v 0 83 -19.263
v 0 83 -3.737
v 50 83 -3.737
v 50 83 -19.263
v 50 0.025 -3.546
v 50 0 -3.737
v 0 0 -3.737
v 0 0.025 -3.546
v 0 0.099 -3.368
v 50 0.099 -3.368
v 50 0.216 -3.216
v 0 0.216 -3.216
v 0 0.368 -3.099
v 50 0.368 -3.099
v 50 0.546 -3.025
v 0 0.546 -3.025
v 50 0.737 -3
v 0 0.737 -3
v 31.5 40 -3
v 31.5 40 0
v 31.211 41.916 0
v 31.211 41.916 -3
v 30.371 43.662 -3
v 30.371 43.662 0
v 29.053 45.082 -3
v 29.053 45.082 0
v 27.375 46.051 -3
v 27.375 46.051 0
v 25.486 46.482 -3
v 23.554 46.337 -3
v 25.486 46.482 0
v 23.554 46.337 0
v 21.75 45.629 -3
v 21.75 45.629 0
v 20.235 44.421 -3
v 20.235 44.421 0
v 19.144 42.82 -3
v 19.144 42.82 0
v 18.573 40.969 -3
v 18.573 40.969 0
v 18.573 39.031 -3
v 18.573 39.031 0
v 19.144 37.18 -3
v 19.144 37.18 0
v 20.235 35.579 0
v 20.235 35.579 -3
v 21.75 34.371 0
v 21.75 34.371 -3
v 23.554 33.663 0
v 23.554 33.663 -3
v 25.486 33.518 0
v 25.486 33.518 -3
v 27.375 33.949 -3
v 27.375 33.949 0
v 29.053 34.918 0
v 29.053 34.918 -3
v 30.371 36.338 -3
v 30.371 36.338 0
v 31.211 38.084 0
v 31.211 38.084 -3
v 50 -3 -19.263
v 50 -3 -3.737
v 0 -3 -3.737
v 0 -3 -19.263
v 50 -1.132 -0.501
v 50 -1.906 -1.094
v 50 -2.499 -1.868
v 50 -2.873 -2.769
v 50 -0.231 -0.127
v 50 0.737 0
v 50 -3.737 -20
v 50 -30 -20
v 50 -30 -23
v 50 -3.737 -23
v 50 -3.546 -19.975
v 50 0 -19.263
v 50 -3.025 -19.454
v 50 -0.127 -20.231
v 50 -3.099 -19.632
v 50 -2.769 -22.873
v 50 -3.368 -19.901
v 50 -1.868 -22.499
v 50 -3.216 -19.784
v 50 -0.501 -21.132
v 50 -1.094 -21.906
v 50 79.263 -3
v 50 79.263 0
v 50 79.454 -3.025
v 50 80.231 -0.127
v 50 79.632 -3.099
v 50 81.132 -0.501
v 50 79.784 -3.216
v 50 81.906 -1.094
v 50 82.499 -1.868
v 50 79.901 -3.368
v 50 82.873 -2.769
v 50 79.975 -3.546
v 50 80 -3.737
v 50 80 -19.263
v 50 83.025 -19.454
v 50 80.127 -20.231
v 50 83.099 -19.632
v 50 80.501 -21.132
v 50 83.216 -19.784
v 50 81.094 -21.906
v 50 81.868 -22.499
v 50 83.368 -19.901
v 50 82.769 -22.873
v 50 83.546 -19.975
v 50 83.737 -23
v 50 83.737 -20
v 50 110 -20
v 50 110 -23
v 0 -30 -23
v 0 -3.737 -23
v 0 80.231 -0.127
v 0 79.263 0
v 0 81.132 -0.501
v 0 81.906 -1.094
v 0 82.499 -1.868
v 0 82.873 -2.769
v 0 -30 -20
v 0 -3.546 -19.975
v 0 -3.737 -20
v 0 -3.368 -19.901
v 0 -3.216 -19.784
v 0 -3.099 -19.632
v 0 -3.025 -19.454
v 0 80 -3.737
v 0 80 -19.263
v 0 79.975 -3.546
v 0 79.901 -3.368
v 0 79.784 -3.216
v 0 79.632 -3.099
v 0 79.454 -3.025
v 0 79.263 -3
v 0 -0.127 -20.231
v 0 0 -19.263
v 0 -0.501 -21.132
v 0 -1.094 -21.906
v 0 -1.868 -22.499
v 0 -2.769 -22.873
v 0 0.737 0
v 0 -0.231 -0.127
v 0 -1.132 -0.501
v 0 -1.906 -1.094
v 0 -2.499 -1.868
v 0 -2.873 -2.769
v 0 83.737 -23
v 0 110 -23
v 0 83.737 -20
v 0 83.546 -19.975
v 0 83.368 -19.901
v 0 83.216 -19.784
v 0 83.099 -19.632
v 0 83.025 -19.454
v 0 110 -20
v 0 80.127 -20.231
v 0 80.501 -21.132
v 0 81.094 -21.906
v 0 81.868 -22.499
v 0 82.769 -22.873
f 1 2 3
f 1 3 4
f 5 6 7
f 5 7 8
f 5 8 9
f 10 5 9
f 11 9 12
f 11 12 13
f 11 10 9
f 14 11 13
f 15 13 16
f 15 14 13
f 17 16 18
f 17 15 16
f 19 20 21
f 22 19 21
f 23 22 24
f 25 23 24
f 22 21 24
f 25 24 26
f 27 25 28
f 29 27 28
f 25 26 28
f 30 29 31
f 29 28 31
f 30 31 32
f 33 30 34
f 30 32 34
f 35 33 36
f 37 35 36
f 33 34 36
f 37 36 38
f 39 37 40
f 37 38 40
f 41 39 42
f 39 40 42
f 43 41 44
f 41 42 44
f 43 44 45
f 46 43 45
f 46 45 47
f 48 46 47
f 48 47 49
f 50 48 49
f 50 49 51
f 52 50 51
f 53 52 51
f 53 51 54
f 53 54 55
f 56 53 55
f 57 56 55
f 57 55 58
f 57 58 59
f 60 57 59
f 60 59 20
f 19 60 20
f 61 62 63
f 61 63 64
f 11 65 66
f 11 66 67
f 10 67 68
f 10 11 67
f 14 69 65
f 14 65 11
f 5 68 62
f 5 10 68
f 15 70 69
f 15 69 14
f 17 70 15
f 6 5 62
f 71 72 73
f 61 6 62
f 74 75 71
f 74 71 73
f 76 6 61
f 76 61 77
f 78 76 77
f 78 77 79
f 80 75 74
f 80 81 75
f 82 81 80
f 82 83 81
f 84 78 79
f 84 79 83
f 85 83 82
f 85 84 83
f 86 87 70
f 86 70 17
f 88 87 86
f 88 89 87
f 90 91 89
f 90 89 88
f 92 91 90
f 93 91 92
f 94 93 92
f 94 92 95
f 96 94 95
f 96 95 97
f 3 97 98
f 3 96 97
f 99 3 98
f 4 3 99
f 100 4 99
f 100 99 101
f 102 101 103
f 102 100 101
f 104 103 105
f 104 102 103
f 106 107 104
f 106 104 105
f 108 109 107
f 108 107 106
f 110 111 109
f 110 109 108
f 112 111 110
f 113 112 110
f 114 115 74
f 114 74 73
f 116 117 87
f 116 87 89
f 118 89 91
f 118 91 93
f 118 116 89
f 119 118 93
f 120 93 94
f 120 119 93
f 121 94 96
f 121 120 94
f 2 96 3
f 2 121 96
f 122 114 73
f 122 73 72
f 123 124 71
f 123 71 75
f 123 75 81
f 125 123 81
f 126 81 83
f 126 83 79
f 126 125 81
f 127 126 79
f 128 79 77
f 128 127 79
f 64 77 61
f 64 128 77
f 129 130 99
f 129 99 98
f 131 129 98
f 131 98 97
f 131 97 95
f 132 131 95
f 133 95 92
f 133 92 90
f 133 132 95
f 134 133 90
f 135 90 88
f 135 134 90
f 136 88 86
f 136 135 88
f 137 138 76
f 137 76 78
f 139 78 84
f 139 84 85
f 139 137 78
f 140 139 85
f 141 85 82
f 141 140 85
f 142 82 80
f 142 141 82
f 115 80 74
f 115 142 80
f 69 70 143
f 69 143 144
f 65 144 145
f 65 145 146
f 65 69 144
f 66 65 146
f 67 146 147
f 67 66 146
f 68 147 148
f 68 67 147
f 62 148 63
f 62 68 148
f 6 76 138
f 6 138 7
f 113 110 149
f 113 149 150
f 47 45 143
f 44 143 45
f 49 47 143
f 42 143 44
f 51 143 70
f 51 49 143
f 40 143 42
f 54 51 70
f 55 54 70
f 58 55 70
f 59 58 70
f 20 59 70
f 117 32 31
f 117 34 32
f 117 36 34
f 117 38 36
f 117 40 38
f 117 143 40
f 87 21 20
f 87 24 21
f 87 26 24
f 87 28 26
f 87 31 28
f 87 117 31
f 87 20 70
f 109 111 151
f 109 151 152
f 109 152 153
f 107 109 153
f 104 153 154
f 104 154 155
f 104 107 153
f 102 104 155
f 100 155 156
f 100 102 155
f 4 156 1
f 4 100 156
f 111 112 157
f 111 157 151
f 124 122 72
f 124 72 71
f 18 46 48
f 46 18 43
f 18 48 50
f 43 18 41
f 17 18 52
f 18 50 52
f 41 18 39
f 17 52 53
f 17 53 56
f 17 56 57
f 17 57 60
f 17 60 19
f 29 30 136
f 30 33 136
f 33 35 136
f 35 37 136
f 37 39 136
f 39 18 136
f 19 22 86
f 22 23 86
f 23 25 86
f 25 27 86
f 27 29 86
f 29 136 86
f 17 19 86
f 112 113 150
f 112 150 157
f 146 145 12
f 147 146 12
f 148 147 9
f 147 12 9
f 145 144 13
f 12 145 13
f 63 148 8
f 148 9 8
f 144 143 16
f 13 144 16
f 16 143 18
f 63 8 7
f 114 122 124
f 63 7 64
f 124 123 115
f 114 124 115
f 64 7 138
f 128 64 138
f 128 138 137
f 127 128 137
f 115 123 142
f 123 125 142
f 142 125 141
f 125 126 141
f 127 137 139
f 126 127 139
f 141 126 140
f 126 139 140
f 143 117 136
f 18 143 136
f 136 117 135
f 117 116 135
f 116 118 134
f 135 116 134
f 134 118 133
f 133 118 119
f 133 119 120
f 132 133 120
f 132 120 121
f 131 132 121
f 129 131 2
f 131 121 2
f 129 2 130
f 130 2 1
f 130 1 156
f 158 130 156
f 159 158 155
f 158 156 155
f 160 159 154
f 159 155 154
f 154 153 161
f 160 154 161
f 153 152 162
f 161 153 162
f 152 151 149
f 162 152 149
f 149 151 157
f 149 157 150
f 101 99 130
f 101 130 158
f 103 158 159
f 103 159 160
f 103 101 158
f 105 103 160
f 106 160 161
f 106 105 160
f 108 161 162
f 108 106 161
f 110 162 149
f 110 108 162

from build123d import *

# Parameters (mm, degrees)
SKETCH_1_W                         = 50
SKETCH_1_H                         = 80
SM_BASE_FLANGE_1_DEPTH             = 3
SM_EDGE_FLANGE_1_STRIP_W           = 13.4732
SM_EDGE_FLANGE_1_STRIP_H           = 3
SM_EDGE_FLANGE_1_STRIP_CUT_DEPTH   = 50
SM_EDGE_FLANGE_1_STRIP_2_W         = 13.4732
SM_EDGE_FLANGE_1_STRIP_2_H         = 3
SM_EDGE_FLANGE_1_STRIP_CUT_2_DEPTH = 50
SM_EDGE_FLANGE_1_DEPTH             = 50
SM_EDGE_FLANGE_1_BEND_DEPTH        = 50
SM_EDGE_FLANGE_2_STRIP_W           = 13.4732
SM_EDGE_FLANGE_2_STRIP_H           = 3
SM_EDGE_FLANGE_2_STRIP_CUT_DEPTH   = 50
SM_EDGE_FLANGE_2_STRIP_2_W         = 13.4732
SM_EDGE_FLANGE_2_STRIP_2_H         = 3
SM_EDGE_FLANGE_2_STRIP_CUT_2_DEPTH = 50
SM_EDGE_FLANGE_2_DEPTH             = 50
SM_EDGE_FLANGE_2_BEND_DEPTH        = 50
SKETCH_18_R                        = 6.5
CUT_EXTRUDE_1_DEPTH                = 124


# Sheet-metal steps are written as plain solids
with BuildPart() as part:
    # Sketch 1 → 基体-法兰1 (new body)
    with BuildSketch(Plane.XY):
        with Locations((25, 40)):
            Rectangle(SKETCH_1_W, SKETCH_1_H)
    extrude(amount=-SM_BASE_FLANGE_1_DEPTH)

    # 边线-法兰1 strip (across the edge) → 边线-法兰1 strip cut (cut)
    with BuildSketch(Plane(origin=(0, 80, -3), x_dir=(0, -1, 0), z_dir=(1, 0, 0))):
        with Locations((-6, -1.5)):
            Rectangle(SM_EDGE_FLANGE_1_STRIP_W, SM_EDGE_FLANGE_1_STRIP_H)
    extrude(amount=SM_EDGE_FLANGE_1_STRIP_CUT_DEPTH, mode=Mode.SUBTRACT)

    # 边线-法兰1 strip 2 (across the edge) → 边线-法兰1 strip cut 2 (cut)
    with BuildSketch(Plane(origin=(50, 0, -3), x_dir=(0, 1, 0), z_dir=(-1, 0, 0))):
        with Locations((-6, -1.5)):
            Rectangle(SM_EDGE_FLANGE_1_STRIP_2_W, SM_EDGE_FLANGE_1_STRIP_2_H)
    extrude(amount=SM_EDGE_FLANGE_1_STRIP_CUT_2_DEPTH, mode=Mode.SUBTRACT)

    # 边线-法兰1 section (across the edge) → 边线-法兰1 (add)
    with BuildSketch(Plane(origin=(0, 80, -3), x_dir=(0, -1, 0), z_dir=(1, 0, 0))):
        with BuildLine():
            Line((-3, 0.7366), (-3, 17))
            Line((-3, 17), (0, 17))
            Line((0, 17), (0, 0.7366))
            ThreePointArc((0, 0.7366), (0.215745145, 0.215745145), (0.7366, 0))
            Line((0.7366, 0), (0.7366, -3))
            ThreePointArc((0.7366, -3), (-1.905575199, -1.905575199), (-3, 0.7366))
        make_face()
    extrude(amount=SM_EDGE_FLANGE_1_DEPTH)

    # 边线-法兰1 section 2 (across the edge) → 边线-法兰1 bend (add)
    with BuildSketch(Plane(origin=(50, 0, -3), x_dir=(0, 1, 0), z_dir=(-1, 0, 0))):
        with BuildLine():
            Line((-3, 0.7366), (-3, 17))
            Line((-3, 17), (0, 17))
            Line((0, 17), (0, 0.7366))
            ThreePointArc((0, 0.7366), (0.215745145, 0.215745145), (0.7366, 0))
            Line((0.7366, 0), (0.7366, -3))
            ThreePointArc((0.7366, -3), (-1.905575199, -1.905575199), (-3, 0.7366))
        make_face()
    extrude(amount=SM_EDGE_FLANGE_1_BEND_DEPTH)

    # 边线-法兰2 strip (across the edge) → 边线-法兰2 strip cut (cut)
    with BuildSketch(Plane(origin=(0, -3, -20), x_dir=(0, 0, 1), z_dir=(1, 0, 0))):
        with Locations((-6, -1.5)):
            Rectangle(SM_EDGE_FLANGE_2_STRIP_W, SM_EDGE_FLANGE_2_STRIP_H)
    extrude(amount=SM_EDGE_FLANGE_2_STRIP_CUT_DEPTH, mode=Mode.SUBTRACT)

    # 边线-法兰2 strip 2 (across the edge) → 边线-法兰2 strip cut 2 (cut)
    with BuildSketch(Plane(origin=(50, 83, -20), x_dir=(0, 0, 1), z_dir=(-1, 0, 0))):
        with Locations((-6, -1.5)):
            Rectangle(SM_EDGE_FLANGE_2_STRIP_2_W, SM_EDGE_FLANGE_2_STRIP_2_H)
    extrude(amount=SM_EDGE_FLANGE_2_STRIP_CUT_2_DEPTH, mode=Mode.SUBTRACT)

    # 边线-法兰2 section (across the edge) → 边线-法兰2 (add)
    with BuildSketch(Plane(origin=(0, -3, -20), x_dir=(0, 0, 1), z_dir=(1, 0, 0))):
        with BuildLine():
            Line((-3, 0.7366), (-3, 27))
            Line((-3, 27), (0, 27))
            Line((0, 27), (0, 0.7366))
            ThreePointArc((0, 0.7366), (0.215745145, 0.215745145), (0.7366, 0))
            Line((0.7366, 0), (0.7366, -3))
            ThreePointArc((0.7366, -3), (-1.905575199, -1.905575199), (-3, 0.7366))
        make_face()
    extrude(amount=SM_EDGE_FLANGE_2_DEPTH)

    # 边线-法兰2 section 2 (across the edge) → 边线-法兰2 bend (add)
    with BuildSketch(Plane(origin=(50, 83, -20), x_dir=(0, 0, 1), z_dir=(-1, 0, 0))):
        with BuildLine():
            Line((-3, 0.7366), (-3, 27))
            Line((-3, 27), (0, 27))
            Line((0, 27), (0, 0.7366))
            ThreePointArc((0, 0.7366), (0.215745145, 0.215745145), (0.7366, 0))
            Line((0.7366, 0), (0.7366, -3))
            ThreePointArc((0.7366, -3), (-1.905575199, -1.905575199), (-3, 0.7366))
        make_face()
    extrude(amount=SM_EDGE_FLANGE_2_BEND_DEPTH)

    # 草图18 → 切除-拉伸1 (cut, through all)
    with BuildSketch(Plane.XY):
        with Locations((25, 40)):
            Circle(SKETCH_18_R)
    extrude(amount=-CUT_EXTRUDE_1_DEPTH, mode=Mode.SUBTRACT)


solid = part.part
